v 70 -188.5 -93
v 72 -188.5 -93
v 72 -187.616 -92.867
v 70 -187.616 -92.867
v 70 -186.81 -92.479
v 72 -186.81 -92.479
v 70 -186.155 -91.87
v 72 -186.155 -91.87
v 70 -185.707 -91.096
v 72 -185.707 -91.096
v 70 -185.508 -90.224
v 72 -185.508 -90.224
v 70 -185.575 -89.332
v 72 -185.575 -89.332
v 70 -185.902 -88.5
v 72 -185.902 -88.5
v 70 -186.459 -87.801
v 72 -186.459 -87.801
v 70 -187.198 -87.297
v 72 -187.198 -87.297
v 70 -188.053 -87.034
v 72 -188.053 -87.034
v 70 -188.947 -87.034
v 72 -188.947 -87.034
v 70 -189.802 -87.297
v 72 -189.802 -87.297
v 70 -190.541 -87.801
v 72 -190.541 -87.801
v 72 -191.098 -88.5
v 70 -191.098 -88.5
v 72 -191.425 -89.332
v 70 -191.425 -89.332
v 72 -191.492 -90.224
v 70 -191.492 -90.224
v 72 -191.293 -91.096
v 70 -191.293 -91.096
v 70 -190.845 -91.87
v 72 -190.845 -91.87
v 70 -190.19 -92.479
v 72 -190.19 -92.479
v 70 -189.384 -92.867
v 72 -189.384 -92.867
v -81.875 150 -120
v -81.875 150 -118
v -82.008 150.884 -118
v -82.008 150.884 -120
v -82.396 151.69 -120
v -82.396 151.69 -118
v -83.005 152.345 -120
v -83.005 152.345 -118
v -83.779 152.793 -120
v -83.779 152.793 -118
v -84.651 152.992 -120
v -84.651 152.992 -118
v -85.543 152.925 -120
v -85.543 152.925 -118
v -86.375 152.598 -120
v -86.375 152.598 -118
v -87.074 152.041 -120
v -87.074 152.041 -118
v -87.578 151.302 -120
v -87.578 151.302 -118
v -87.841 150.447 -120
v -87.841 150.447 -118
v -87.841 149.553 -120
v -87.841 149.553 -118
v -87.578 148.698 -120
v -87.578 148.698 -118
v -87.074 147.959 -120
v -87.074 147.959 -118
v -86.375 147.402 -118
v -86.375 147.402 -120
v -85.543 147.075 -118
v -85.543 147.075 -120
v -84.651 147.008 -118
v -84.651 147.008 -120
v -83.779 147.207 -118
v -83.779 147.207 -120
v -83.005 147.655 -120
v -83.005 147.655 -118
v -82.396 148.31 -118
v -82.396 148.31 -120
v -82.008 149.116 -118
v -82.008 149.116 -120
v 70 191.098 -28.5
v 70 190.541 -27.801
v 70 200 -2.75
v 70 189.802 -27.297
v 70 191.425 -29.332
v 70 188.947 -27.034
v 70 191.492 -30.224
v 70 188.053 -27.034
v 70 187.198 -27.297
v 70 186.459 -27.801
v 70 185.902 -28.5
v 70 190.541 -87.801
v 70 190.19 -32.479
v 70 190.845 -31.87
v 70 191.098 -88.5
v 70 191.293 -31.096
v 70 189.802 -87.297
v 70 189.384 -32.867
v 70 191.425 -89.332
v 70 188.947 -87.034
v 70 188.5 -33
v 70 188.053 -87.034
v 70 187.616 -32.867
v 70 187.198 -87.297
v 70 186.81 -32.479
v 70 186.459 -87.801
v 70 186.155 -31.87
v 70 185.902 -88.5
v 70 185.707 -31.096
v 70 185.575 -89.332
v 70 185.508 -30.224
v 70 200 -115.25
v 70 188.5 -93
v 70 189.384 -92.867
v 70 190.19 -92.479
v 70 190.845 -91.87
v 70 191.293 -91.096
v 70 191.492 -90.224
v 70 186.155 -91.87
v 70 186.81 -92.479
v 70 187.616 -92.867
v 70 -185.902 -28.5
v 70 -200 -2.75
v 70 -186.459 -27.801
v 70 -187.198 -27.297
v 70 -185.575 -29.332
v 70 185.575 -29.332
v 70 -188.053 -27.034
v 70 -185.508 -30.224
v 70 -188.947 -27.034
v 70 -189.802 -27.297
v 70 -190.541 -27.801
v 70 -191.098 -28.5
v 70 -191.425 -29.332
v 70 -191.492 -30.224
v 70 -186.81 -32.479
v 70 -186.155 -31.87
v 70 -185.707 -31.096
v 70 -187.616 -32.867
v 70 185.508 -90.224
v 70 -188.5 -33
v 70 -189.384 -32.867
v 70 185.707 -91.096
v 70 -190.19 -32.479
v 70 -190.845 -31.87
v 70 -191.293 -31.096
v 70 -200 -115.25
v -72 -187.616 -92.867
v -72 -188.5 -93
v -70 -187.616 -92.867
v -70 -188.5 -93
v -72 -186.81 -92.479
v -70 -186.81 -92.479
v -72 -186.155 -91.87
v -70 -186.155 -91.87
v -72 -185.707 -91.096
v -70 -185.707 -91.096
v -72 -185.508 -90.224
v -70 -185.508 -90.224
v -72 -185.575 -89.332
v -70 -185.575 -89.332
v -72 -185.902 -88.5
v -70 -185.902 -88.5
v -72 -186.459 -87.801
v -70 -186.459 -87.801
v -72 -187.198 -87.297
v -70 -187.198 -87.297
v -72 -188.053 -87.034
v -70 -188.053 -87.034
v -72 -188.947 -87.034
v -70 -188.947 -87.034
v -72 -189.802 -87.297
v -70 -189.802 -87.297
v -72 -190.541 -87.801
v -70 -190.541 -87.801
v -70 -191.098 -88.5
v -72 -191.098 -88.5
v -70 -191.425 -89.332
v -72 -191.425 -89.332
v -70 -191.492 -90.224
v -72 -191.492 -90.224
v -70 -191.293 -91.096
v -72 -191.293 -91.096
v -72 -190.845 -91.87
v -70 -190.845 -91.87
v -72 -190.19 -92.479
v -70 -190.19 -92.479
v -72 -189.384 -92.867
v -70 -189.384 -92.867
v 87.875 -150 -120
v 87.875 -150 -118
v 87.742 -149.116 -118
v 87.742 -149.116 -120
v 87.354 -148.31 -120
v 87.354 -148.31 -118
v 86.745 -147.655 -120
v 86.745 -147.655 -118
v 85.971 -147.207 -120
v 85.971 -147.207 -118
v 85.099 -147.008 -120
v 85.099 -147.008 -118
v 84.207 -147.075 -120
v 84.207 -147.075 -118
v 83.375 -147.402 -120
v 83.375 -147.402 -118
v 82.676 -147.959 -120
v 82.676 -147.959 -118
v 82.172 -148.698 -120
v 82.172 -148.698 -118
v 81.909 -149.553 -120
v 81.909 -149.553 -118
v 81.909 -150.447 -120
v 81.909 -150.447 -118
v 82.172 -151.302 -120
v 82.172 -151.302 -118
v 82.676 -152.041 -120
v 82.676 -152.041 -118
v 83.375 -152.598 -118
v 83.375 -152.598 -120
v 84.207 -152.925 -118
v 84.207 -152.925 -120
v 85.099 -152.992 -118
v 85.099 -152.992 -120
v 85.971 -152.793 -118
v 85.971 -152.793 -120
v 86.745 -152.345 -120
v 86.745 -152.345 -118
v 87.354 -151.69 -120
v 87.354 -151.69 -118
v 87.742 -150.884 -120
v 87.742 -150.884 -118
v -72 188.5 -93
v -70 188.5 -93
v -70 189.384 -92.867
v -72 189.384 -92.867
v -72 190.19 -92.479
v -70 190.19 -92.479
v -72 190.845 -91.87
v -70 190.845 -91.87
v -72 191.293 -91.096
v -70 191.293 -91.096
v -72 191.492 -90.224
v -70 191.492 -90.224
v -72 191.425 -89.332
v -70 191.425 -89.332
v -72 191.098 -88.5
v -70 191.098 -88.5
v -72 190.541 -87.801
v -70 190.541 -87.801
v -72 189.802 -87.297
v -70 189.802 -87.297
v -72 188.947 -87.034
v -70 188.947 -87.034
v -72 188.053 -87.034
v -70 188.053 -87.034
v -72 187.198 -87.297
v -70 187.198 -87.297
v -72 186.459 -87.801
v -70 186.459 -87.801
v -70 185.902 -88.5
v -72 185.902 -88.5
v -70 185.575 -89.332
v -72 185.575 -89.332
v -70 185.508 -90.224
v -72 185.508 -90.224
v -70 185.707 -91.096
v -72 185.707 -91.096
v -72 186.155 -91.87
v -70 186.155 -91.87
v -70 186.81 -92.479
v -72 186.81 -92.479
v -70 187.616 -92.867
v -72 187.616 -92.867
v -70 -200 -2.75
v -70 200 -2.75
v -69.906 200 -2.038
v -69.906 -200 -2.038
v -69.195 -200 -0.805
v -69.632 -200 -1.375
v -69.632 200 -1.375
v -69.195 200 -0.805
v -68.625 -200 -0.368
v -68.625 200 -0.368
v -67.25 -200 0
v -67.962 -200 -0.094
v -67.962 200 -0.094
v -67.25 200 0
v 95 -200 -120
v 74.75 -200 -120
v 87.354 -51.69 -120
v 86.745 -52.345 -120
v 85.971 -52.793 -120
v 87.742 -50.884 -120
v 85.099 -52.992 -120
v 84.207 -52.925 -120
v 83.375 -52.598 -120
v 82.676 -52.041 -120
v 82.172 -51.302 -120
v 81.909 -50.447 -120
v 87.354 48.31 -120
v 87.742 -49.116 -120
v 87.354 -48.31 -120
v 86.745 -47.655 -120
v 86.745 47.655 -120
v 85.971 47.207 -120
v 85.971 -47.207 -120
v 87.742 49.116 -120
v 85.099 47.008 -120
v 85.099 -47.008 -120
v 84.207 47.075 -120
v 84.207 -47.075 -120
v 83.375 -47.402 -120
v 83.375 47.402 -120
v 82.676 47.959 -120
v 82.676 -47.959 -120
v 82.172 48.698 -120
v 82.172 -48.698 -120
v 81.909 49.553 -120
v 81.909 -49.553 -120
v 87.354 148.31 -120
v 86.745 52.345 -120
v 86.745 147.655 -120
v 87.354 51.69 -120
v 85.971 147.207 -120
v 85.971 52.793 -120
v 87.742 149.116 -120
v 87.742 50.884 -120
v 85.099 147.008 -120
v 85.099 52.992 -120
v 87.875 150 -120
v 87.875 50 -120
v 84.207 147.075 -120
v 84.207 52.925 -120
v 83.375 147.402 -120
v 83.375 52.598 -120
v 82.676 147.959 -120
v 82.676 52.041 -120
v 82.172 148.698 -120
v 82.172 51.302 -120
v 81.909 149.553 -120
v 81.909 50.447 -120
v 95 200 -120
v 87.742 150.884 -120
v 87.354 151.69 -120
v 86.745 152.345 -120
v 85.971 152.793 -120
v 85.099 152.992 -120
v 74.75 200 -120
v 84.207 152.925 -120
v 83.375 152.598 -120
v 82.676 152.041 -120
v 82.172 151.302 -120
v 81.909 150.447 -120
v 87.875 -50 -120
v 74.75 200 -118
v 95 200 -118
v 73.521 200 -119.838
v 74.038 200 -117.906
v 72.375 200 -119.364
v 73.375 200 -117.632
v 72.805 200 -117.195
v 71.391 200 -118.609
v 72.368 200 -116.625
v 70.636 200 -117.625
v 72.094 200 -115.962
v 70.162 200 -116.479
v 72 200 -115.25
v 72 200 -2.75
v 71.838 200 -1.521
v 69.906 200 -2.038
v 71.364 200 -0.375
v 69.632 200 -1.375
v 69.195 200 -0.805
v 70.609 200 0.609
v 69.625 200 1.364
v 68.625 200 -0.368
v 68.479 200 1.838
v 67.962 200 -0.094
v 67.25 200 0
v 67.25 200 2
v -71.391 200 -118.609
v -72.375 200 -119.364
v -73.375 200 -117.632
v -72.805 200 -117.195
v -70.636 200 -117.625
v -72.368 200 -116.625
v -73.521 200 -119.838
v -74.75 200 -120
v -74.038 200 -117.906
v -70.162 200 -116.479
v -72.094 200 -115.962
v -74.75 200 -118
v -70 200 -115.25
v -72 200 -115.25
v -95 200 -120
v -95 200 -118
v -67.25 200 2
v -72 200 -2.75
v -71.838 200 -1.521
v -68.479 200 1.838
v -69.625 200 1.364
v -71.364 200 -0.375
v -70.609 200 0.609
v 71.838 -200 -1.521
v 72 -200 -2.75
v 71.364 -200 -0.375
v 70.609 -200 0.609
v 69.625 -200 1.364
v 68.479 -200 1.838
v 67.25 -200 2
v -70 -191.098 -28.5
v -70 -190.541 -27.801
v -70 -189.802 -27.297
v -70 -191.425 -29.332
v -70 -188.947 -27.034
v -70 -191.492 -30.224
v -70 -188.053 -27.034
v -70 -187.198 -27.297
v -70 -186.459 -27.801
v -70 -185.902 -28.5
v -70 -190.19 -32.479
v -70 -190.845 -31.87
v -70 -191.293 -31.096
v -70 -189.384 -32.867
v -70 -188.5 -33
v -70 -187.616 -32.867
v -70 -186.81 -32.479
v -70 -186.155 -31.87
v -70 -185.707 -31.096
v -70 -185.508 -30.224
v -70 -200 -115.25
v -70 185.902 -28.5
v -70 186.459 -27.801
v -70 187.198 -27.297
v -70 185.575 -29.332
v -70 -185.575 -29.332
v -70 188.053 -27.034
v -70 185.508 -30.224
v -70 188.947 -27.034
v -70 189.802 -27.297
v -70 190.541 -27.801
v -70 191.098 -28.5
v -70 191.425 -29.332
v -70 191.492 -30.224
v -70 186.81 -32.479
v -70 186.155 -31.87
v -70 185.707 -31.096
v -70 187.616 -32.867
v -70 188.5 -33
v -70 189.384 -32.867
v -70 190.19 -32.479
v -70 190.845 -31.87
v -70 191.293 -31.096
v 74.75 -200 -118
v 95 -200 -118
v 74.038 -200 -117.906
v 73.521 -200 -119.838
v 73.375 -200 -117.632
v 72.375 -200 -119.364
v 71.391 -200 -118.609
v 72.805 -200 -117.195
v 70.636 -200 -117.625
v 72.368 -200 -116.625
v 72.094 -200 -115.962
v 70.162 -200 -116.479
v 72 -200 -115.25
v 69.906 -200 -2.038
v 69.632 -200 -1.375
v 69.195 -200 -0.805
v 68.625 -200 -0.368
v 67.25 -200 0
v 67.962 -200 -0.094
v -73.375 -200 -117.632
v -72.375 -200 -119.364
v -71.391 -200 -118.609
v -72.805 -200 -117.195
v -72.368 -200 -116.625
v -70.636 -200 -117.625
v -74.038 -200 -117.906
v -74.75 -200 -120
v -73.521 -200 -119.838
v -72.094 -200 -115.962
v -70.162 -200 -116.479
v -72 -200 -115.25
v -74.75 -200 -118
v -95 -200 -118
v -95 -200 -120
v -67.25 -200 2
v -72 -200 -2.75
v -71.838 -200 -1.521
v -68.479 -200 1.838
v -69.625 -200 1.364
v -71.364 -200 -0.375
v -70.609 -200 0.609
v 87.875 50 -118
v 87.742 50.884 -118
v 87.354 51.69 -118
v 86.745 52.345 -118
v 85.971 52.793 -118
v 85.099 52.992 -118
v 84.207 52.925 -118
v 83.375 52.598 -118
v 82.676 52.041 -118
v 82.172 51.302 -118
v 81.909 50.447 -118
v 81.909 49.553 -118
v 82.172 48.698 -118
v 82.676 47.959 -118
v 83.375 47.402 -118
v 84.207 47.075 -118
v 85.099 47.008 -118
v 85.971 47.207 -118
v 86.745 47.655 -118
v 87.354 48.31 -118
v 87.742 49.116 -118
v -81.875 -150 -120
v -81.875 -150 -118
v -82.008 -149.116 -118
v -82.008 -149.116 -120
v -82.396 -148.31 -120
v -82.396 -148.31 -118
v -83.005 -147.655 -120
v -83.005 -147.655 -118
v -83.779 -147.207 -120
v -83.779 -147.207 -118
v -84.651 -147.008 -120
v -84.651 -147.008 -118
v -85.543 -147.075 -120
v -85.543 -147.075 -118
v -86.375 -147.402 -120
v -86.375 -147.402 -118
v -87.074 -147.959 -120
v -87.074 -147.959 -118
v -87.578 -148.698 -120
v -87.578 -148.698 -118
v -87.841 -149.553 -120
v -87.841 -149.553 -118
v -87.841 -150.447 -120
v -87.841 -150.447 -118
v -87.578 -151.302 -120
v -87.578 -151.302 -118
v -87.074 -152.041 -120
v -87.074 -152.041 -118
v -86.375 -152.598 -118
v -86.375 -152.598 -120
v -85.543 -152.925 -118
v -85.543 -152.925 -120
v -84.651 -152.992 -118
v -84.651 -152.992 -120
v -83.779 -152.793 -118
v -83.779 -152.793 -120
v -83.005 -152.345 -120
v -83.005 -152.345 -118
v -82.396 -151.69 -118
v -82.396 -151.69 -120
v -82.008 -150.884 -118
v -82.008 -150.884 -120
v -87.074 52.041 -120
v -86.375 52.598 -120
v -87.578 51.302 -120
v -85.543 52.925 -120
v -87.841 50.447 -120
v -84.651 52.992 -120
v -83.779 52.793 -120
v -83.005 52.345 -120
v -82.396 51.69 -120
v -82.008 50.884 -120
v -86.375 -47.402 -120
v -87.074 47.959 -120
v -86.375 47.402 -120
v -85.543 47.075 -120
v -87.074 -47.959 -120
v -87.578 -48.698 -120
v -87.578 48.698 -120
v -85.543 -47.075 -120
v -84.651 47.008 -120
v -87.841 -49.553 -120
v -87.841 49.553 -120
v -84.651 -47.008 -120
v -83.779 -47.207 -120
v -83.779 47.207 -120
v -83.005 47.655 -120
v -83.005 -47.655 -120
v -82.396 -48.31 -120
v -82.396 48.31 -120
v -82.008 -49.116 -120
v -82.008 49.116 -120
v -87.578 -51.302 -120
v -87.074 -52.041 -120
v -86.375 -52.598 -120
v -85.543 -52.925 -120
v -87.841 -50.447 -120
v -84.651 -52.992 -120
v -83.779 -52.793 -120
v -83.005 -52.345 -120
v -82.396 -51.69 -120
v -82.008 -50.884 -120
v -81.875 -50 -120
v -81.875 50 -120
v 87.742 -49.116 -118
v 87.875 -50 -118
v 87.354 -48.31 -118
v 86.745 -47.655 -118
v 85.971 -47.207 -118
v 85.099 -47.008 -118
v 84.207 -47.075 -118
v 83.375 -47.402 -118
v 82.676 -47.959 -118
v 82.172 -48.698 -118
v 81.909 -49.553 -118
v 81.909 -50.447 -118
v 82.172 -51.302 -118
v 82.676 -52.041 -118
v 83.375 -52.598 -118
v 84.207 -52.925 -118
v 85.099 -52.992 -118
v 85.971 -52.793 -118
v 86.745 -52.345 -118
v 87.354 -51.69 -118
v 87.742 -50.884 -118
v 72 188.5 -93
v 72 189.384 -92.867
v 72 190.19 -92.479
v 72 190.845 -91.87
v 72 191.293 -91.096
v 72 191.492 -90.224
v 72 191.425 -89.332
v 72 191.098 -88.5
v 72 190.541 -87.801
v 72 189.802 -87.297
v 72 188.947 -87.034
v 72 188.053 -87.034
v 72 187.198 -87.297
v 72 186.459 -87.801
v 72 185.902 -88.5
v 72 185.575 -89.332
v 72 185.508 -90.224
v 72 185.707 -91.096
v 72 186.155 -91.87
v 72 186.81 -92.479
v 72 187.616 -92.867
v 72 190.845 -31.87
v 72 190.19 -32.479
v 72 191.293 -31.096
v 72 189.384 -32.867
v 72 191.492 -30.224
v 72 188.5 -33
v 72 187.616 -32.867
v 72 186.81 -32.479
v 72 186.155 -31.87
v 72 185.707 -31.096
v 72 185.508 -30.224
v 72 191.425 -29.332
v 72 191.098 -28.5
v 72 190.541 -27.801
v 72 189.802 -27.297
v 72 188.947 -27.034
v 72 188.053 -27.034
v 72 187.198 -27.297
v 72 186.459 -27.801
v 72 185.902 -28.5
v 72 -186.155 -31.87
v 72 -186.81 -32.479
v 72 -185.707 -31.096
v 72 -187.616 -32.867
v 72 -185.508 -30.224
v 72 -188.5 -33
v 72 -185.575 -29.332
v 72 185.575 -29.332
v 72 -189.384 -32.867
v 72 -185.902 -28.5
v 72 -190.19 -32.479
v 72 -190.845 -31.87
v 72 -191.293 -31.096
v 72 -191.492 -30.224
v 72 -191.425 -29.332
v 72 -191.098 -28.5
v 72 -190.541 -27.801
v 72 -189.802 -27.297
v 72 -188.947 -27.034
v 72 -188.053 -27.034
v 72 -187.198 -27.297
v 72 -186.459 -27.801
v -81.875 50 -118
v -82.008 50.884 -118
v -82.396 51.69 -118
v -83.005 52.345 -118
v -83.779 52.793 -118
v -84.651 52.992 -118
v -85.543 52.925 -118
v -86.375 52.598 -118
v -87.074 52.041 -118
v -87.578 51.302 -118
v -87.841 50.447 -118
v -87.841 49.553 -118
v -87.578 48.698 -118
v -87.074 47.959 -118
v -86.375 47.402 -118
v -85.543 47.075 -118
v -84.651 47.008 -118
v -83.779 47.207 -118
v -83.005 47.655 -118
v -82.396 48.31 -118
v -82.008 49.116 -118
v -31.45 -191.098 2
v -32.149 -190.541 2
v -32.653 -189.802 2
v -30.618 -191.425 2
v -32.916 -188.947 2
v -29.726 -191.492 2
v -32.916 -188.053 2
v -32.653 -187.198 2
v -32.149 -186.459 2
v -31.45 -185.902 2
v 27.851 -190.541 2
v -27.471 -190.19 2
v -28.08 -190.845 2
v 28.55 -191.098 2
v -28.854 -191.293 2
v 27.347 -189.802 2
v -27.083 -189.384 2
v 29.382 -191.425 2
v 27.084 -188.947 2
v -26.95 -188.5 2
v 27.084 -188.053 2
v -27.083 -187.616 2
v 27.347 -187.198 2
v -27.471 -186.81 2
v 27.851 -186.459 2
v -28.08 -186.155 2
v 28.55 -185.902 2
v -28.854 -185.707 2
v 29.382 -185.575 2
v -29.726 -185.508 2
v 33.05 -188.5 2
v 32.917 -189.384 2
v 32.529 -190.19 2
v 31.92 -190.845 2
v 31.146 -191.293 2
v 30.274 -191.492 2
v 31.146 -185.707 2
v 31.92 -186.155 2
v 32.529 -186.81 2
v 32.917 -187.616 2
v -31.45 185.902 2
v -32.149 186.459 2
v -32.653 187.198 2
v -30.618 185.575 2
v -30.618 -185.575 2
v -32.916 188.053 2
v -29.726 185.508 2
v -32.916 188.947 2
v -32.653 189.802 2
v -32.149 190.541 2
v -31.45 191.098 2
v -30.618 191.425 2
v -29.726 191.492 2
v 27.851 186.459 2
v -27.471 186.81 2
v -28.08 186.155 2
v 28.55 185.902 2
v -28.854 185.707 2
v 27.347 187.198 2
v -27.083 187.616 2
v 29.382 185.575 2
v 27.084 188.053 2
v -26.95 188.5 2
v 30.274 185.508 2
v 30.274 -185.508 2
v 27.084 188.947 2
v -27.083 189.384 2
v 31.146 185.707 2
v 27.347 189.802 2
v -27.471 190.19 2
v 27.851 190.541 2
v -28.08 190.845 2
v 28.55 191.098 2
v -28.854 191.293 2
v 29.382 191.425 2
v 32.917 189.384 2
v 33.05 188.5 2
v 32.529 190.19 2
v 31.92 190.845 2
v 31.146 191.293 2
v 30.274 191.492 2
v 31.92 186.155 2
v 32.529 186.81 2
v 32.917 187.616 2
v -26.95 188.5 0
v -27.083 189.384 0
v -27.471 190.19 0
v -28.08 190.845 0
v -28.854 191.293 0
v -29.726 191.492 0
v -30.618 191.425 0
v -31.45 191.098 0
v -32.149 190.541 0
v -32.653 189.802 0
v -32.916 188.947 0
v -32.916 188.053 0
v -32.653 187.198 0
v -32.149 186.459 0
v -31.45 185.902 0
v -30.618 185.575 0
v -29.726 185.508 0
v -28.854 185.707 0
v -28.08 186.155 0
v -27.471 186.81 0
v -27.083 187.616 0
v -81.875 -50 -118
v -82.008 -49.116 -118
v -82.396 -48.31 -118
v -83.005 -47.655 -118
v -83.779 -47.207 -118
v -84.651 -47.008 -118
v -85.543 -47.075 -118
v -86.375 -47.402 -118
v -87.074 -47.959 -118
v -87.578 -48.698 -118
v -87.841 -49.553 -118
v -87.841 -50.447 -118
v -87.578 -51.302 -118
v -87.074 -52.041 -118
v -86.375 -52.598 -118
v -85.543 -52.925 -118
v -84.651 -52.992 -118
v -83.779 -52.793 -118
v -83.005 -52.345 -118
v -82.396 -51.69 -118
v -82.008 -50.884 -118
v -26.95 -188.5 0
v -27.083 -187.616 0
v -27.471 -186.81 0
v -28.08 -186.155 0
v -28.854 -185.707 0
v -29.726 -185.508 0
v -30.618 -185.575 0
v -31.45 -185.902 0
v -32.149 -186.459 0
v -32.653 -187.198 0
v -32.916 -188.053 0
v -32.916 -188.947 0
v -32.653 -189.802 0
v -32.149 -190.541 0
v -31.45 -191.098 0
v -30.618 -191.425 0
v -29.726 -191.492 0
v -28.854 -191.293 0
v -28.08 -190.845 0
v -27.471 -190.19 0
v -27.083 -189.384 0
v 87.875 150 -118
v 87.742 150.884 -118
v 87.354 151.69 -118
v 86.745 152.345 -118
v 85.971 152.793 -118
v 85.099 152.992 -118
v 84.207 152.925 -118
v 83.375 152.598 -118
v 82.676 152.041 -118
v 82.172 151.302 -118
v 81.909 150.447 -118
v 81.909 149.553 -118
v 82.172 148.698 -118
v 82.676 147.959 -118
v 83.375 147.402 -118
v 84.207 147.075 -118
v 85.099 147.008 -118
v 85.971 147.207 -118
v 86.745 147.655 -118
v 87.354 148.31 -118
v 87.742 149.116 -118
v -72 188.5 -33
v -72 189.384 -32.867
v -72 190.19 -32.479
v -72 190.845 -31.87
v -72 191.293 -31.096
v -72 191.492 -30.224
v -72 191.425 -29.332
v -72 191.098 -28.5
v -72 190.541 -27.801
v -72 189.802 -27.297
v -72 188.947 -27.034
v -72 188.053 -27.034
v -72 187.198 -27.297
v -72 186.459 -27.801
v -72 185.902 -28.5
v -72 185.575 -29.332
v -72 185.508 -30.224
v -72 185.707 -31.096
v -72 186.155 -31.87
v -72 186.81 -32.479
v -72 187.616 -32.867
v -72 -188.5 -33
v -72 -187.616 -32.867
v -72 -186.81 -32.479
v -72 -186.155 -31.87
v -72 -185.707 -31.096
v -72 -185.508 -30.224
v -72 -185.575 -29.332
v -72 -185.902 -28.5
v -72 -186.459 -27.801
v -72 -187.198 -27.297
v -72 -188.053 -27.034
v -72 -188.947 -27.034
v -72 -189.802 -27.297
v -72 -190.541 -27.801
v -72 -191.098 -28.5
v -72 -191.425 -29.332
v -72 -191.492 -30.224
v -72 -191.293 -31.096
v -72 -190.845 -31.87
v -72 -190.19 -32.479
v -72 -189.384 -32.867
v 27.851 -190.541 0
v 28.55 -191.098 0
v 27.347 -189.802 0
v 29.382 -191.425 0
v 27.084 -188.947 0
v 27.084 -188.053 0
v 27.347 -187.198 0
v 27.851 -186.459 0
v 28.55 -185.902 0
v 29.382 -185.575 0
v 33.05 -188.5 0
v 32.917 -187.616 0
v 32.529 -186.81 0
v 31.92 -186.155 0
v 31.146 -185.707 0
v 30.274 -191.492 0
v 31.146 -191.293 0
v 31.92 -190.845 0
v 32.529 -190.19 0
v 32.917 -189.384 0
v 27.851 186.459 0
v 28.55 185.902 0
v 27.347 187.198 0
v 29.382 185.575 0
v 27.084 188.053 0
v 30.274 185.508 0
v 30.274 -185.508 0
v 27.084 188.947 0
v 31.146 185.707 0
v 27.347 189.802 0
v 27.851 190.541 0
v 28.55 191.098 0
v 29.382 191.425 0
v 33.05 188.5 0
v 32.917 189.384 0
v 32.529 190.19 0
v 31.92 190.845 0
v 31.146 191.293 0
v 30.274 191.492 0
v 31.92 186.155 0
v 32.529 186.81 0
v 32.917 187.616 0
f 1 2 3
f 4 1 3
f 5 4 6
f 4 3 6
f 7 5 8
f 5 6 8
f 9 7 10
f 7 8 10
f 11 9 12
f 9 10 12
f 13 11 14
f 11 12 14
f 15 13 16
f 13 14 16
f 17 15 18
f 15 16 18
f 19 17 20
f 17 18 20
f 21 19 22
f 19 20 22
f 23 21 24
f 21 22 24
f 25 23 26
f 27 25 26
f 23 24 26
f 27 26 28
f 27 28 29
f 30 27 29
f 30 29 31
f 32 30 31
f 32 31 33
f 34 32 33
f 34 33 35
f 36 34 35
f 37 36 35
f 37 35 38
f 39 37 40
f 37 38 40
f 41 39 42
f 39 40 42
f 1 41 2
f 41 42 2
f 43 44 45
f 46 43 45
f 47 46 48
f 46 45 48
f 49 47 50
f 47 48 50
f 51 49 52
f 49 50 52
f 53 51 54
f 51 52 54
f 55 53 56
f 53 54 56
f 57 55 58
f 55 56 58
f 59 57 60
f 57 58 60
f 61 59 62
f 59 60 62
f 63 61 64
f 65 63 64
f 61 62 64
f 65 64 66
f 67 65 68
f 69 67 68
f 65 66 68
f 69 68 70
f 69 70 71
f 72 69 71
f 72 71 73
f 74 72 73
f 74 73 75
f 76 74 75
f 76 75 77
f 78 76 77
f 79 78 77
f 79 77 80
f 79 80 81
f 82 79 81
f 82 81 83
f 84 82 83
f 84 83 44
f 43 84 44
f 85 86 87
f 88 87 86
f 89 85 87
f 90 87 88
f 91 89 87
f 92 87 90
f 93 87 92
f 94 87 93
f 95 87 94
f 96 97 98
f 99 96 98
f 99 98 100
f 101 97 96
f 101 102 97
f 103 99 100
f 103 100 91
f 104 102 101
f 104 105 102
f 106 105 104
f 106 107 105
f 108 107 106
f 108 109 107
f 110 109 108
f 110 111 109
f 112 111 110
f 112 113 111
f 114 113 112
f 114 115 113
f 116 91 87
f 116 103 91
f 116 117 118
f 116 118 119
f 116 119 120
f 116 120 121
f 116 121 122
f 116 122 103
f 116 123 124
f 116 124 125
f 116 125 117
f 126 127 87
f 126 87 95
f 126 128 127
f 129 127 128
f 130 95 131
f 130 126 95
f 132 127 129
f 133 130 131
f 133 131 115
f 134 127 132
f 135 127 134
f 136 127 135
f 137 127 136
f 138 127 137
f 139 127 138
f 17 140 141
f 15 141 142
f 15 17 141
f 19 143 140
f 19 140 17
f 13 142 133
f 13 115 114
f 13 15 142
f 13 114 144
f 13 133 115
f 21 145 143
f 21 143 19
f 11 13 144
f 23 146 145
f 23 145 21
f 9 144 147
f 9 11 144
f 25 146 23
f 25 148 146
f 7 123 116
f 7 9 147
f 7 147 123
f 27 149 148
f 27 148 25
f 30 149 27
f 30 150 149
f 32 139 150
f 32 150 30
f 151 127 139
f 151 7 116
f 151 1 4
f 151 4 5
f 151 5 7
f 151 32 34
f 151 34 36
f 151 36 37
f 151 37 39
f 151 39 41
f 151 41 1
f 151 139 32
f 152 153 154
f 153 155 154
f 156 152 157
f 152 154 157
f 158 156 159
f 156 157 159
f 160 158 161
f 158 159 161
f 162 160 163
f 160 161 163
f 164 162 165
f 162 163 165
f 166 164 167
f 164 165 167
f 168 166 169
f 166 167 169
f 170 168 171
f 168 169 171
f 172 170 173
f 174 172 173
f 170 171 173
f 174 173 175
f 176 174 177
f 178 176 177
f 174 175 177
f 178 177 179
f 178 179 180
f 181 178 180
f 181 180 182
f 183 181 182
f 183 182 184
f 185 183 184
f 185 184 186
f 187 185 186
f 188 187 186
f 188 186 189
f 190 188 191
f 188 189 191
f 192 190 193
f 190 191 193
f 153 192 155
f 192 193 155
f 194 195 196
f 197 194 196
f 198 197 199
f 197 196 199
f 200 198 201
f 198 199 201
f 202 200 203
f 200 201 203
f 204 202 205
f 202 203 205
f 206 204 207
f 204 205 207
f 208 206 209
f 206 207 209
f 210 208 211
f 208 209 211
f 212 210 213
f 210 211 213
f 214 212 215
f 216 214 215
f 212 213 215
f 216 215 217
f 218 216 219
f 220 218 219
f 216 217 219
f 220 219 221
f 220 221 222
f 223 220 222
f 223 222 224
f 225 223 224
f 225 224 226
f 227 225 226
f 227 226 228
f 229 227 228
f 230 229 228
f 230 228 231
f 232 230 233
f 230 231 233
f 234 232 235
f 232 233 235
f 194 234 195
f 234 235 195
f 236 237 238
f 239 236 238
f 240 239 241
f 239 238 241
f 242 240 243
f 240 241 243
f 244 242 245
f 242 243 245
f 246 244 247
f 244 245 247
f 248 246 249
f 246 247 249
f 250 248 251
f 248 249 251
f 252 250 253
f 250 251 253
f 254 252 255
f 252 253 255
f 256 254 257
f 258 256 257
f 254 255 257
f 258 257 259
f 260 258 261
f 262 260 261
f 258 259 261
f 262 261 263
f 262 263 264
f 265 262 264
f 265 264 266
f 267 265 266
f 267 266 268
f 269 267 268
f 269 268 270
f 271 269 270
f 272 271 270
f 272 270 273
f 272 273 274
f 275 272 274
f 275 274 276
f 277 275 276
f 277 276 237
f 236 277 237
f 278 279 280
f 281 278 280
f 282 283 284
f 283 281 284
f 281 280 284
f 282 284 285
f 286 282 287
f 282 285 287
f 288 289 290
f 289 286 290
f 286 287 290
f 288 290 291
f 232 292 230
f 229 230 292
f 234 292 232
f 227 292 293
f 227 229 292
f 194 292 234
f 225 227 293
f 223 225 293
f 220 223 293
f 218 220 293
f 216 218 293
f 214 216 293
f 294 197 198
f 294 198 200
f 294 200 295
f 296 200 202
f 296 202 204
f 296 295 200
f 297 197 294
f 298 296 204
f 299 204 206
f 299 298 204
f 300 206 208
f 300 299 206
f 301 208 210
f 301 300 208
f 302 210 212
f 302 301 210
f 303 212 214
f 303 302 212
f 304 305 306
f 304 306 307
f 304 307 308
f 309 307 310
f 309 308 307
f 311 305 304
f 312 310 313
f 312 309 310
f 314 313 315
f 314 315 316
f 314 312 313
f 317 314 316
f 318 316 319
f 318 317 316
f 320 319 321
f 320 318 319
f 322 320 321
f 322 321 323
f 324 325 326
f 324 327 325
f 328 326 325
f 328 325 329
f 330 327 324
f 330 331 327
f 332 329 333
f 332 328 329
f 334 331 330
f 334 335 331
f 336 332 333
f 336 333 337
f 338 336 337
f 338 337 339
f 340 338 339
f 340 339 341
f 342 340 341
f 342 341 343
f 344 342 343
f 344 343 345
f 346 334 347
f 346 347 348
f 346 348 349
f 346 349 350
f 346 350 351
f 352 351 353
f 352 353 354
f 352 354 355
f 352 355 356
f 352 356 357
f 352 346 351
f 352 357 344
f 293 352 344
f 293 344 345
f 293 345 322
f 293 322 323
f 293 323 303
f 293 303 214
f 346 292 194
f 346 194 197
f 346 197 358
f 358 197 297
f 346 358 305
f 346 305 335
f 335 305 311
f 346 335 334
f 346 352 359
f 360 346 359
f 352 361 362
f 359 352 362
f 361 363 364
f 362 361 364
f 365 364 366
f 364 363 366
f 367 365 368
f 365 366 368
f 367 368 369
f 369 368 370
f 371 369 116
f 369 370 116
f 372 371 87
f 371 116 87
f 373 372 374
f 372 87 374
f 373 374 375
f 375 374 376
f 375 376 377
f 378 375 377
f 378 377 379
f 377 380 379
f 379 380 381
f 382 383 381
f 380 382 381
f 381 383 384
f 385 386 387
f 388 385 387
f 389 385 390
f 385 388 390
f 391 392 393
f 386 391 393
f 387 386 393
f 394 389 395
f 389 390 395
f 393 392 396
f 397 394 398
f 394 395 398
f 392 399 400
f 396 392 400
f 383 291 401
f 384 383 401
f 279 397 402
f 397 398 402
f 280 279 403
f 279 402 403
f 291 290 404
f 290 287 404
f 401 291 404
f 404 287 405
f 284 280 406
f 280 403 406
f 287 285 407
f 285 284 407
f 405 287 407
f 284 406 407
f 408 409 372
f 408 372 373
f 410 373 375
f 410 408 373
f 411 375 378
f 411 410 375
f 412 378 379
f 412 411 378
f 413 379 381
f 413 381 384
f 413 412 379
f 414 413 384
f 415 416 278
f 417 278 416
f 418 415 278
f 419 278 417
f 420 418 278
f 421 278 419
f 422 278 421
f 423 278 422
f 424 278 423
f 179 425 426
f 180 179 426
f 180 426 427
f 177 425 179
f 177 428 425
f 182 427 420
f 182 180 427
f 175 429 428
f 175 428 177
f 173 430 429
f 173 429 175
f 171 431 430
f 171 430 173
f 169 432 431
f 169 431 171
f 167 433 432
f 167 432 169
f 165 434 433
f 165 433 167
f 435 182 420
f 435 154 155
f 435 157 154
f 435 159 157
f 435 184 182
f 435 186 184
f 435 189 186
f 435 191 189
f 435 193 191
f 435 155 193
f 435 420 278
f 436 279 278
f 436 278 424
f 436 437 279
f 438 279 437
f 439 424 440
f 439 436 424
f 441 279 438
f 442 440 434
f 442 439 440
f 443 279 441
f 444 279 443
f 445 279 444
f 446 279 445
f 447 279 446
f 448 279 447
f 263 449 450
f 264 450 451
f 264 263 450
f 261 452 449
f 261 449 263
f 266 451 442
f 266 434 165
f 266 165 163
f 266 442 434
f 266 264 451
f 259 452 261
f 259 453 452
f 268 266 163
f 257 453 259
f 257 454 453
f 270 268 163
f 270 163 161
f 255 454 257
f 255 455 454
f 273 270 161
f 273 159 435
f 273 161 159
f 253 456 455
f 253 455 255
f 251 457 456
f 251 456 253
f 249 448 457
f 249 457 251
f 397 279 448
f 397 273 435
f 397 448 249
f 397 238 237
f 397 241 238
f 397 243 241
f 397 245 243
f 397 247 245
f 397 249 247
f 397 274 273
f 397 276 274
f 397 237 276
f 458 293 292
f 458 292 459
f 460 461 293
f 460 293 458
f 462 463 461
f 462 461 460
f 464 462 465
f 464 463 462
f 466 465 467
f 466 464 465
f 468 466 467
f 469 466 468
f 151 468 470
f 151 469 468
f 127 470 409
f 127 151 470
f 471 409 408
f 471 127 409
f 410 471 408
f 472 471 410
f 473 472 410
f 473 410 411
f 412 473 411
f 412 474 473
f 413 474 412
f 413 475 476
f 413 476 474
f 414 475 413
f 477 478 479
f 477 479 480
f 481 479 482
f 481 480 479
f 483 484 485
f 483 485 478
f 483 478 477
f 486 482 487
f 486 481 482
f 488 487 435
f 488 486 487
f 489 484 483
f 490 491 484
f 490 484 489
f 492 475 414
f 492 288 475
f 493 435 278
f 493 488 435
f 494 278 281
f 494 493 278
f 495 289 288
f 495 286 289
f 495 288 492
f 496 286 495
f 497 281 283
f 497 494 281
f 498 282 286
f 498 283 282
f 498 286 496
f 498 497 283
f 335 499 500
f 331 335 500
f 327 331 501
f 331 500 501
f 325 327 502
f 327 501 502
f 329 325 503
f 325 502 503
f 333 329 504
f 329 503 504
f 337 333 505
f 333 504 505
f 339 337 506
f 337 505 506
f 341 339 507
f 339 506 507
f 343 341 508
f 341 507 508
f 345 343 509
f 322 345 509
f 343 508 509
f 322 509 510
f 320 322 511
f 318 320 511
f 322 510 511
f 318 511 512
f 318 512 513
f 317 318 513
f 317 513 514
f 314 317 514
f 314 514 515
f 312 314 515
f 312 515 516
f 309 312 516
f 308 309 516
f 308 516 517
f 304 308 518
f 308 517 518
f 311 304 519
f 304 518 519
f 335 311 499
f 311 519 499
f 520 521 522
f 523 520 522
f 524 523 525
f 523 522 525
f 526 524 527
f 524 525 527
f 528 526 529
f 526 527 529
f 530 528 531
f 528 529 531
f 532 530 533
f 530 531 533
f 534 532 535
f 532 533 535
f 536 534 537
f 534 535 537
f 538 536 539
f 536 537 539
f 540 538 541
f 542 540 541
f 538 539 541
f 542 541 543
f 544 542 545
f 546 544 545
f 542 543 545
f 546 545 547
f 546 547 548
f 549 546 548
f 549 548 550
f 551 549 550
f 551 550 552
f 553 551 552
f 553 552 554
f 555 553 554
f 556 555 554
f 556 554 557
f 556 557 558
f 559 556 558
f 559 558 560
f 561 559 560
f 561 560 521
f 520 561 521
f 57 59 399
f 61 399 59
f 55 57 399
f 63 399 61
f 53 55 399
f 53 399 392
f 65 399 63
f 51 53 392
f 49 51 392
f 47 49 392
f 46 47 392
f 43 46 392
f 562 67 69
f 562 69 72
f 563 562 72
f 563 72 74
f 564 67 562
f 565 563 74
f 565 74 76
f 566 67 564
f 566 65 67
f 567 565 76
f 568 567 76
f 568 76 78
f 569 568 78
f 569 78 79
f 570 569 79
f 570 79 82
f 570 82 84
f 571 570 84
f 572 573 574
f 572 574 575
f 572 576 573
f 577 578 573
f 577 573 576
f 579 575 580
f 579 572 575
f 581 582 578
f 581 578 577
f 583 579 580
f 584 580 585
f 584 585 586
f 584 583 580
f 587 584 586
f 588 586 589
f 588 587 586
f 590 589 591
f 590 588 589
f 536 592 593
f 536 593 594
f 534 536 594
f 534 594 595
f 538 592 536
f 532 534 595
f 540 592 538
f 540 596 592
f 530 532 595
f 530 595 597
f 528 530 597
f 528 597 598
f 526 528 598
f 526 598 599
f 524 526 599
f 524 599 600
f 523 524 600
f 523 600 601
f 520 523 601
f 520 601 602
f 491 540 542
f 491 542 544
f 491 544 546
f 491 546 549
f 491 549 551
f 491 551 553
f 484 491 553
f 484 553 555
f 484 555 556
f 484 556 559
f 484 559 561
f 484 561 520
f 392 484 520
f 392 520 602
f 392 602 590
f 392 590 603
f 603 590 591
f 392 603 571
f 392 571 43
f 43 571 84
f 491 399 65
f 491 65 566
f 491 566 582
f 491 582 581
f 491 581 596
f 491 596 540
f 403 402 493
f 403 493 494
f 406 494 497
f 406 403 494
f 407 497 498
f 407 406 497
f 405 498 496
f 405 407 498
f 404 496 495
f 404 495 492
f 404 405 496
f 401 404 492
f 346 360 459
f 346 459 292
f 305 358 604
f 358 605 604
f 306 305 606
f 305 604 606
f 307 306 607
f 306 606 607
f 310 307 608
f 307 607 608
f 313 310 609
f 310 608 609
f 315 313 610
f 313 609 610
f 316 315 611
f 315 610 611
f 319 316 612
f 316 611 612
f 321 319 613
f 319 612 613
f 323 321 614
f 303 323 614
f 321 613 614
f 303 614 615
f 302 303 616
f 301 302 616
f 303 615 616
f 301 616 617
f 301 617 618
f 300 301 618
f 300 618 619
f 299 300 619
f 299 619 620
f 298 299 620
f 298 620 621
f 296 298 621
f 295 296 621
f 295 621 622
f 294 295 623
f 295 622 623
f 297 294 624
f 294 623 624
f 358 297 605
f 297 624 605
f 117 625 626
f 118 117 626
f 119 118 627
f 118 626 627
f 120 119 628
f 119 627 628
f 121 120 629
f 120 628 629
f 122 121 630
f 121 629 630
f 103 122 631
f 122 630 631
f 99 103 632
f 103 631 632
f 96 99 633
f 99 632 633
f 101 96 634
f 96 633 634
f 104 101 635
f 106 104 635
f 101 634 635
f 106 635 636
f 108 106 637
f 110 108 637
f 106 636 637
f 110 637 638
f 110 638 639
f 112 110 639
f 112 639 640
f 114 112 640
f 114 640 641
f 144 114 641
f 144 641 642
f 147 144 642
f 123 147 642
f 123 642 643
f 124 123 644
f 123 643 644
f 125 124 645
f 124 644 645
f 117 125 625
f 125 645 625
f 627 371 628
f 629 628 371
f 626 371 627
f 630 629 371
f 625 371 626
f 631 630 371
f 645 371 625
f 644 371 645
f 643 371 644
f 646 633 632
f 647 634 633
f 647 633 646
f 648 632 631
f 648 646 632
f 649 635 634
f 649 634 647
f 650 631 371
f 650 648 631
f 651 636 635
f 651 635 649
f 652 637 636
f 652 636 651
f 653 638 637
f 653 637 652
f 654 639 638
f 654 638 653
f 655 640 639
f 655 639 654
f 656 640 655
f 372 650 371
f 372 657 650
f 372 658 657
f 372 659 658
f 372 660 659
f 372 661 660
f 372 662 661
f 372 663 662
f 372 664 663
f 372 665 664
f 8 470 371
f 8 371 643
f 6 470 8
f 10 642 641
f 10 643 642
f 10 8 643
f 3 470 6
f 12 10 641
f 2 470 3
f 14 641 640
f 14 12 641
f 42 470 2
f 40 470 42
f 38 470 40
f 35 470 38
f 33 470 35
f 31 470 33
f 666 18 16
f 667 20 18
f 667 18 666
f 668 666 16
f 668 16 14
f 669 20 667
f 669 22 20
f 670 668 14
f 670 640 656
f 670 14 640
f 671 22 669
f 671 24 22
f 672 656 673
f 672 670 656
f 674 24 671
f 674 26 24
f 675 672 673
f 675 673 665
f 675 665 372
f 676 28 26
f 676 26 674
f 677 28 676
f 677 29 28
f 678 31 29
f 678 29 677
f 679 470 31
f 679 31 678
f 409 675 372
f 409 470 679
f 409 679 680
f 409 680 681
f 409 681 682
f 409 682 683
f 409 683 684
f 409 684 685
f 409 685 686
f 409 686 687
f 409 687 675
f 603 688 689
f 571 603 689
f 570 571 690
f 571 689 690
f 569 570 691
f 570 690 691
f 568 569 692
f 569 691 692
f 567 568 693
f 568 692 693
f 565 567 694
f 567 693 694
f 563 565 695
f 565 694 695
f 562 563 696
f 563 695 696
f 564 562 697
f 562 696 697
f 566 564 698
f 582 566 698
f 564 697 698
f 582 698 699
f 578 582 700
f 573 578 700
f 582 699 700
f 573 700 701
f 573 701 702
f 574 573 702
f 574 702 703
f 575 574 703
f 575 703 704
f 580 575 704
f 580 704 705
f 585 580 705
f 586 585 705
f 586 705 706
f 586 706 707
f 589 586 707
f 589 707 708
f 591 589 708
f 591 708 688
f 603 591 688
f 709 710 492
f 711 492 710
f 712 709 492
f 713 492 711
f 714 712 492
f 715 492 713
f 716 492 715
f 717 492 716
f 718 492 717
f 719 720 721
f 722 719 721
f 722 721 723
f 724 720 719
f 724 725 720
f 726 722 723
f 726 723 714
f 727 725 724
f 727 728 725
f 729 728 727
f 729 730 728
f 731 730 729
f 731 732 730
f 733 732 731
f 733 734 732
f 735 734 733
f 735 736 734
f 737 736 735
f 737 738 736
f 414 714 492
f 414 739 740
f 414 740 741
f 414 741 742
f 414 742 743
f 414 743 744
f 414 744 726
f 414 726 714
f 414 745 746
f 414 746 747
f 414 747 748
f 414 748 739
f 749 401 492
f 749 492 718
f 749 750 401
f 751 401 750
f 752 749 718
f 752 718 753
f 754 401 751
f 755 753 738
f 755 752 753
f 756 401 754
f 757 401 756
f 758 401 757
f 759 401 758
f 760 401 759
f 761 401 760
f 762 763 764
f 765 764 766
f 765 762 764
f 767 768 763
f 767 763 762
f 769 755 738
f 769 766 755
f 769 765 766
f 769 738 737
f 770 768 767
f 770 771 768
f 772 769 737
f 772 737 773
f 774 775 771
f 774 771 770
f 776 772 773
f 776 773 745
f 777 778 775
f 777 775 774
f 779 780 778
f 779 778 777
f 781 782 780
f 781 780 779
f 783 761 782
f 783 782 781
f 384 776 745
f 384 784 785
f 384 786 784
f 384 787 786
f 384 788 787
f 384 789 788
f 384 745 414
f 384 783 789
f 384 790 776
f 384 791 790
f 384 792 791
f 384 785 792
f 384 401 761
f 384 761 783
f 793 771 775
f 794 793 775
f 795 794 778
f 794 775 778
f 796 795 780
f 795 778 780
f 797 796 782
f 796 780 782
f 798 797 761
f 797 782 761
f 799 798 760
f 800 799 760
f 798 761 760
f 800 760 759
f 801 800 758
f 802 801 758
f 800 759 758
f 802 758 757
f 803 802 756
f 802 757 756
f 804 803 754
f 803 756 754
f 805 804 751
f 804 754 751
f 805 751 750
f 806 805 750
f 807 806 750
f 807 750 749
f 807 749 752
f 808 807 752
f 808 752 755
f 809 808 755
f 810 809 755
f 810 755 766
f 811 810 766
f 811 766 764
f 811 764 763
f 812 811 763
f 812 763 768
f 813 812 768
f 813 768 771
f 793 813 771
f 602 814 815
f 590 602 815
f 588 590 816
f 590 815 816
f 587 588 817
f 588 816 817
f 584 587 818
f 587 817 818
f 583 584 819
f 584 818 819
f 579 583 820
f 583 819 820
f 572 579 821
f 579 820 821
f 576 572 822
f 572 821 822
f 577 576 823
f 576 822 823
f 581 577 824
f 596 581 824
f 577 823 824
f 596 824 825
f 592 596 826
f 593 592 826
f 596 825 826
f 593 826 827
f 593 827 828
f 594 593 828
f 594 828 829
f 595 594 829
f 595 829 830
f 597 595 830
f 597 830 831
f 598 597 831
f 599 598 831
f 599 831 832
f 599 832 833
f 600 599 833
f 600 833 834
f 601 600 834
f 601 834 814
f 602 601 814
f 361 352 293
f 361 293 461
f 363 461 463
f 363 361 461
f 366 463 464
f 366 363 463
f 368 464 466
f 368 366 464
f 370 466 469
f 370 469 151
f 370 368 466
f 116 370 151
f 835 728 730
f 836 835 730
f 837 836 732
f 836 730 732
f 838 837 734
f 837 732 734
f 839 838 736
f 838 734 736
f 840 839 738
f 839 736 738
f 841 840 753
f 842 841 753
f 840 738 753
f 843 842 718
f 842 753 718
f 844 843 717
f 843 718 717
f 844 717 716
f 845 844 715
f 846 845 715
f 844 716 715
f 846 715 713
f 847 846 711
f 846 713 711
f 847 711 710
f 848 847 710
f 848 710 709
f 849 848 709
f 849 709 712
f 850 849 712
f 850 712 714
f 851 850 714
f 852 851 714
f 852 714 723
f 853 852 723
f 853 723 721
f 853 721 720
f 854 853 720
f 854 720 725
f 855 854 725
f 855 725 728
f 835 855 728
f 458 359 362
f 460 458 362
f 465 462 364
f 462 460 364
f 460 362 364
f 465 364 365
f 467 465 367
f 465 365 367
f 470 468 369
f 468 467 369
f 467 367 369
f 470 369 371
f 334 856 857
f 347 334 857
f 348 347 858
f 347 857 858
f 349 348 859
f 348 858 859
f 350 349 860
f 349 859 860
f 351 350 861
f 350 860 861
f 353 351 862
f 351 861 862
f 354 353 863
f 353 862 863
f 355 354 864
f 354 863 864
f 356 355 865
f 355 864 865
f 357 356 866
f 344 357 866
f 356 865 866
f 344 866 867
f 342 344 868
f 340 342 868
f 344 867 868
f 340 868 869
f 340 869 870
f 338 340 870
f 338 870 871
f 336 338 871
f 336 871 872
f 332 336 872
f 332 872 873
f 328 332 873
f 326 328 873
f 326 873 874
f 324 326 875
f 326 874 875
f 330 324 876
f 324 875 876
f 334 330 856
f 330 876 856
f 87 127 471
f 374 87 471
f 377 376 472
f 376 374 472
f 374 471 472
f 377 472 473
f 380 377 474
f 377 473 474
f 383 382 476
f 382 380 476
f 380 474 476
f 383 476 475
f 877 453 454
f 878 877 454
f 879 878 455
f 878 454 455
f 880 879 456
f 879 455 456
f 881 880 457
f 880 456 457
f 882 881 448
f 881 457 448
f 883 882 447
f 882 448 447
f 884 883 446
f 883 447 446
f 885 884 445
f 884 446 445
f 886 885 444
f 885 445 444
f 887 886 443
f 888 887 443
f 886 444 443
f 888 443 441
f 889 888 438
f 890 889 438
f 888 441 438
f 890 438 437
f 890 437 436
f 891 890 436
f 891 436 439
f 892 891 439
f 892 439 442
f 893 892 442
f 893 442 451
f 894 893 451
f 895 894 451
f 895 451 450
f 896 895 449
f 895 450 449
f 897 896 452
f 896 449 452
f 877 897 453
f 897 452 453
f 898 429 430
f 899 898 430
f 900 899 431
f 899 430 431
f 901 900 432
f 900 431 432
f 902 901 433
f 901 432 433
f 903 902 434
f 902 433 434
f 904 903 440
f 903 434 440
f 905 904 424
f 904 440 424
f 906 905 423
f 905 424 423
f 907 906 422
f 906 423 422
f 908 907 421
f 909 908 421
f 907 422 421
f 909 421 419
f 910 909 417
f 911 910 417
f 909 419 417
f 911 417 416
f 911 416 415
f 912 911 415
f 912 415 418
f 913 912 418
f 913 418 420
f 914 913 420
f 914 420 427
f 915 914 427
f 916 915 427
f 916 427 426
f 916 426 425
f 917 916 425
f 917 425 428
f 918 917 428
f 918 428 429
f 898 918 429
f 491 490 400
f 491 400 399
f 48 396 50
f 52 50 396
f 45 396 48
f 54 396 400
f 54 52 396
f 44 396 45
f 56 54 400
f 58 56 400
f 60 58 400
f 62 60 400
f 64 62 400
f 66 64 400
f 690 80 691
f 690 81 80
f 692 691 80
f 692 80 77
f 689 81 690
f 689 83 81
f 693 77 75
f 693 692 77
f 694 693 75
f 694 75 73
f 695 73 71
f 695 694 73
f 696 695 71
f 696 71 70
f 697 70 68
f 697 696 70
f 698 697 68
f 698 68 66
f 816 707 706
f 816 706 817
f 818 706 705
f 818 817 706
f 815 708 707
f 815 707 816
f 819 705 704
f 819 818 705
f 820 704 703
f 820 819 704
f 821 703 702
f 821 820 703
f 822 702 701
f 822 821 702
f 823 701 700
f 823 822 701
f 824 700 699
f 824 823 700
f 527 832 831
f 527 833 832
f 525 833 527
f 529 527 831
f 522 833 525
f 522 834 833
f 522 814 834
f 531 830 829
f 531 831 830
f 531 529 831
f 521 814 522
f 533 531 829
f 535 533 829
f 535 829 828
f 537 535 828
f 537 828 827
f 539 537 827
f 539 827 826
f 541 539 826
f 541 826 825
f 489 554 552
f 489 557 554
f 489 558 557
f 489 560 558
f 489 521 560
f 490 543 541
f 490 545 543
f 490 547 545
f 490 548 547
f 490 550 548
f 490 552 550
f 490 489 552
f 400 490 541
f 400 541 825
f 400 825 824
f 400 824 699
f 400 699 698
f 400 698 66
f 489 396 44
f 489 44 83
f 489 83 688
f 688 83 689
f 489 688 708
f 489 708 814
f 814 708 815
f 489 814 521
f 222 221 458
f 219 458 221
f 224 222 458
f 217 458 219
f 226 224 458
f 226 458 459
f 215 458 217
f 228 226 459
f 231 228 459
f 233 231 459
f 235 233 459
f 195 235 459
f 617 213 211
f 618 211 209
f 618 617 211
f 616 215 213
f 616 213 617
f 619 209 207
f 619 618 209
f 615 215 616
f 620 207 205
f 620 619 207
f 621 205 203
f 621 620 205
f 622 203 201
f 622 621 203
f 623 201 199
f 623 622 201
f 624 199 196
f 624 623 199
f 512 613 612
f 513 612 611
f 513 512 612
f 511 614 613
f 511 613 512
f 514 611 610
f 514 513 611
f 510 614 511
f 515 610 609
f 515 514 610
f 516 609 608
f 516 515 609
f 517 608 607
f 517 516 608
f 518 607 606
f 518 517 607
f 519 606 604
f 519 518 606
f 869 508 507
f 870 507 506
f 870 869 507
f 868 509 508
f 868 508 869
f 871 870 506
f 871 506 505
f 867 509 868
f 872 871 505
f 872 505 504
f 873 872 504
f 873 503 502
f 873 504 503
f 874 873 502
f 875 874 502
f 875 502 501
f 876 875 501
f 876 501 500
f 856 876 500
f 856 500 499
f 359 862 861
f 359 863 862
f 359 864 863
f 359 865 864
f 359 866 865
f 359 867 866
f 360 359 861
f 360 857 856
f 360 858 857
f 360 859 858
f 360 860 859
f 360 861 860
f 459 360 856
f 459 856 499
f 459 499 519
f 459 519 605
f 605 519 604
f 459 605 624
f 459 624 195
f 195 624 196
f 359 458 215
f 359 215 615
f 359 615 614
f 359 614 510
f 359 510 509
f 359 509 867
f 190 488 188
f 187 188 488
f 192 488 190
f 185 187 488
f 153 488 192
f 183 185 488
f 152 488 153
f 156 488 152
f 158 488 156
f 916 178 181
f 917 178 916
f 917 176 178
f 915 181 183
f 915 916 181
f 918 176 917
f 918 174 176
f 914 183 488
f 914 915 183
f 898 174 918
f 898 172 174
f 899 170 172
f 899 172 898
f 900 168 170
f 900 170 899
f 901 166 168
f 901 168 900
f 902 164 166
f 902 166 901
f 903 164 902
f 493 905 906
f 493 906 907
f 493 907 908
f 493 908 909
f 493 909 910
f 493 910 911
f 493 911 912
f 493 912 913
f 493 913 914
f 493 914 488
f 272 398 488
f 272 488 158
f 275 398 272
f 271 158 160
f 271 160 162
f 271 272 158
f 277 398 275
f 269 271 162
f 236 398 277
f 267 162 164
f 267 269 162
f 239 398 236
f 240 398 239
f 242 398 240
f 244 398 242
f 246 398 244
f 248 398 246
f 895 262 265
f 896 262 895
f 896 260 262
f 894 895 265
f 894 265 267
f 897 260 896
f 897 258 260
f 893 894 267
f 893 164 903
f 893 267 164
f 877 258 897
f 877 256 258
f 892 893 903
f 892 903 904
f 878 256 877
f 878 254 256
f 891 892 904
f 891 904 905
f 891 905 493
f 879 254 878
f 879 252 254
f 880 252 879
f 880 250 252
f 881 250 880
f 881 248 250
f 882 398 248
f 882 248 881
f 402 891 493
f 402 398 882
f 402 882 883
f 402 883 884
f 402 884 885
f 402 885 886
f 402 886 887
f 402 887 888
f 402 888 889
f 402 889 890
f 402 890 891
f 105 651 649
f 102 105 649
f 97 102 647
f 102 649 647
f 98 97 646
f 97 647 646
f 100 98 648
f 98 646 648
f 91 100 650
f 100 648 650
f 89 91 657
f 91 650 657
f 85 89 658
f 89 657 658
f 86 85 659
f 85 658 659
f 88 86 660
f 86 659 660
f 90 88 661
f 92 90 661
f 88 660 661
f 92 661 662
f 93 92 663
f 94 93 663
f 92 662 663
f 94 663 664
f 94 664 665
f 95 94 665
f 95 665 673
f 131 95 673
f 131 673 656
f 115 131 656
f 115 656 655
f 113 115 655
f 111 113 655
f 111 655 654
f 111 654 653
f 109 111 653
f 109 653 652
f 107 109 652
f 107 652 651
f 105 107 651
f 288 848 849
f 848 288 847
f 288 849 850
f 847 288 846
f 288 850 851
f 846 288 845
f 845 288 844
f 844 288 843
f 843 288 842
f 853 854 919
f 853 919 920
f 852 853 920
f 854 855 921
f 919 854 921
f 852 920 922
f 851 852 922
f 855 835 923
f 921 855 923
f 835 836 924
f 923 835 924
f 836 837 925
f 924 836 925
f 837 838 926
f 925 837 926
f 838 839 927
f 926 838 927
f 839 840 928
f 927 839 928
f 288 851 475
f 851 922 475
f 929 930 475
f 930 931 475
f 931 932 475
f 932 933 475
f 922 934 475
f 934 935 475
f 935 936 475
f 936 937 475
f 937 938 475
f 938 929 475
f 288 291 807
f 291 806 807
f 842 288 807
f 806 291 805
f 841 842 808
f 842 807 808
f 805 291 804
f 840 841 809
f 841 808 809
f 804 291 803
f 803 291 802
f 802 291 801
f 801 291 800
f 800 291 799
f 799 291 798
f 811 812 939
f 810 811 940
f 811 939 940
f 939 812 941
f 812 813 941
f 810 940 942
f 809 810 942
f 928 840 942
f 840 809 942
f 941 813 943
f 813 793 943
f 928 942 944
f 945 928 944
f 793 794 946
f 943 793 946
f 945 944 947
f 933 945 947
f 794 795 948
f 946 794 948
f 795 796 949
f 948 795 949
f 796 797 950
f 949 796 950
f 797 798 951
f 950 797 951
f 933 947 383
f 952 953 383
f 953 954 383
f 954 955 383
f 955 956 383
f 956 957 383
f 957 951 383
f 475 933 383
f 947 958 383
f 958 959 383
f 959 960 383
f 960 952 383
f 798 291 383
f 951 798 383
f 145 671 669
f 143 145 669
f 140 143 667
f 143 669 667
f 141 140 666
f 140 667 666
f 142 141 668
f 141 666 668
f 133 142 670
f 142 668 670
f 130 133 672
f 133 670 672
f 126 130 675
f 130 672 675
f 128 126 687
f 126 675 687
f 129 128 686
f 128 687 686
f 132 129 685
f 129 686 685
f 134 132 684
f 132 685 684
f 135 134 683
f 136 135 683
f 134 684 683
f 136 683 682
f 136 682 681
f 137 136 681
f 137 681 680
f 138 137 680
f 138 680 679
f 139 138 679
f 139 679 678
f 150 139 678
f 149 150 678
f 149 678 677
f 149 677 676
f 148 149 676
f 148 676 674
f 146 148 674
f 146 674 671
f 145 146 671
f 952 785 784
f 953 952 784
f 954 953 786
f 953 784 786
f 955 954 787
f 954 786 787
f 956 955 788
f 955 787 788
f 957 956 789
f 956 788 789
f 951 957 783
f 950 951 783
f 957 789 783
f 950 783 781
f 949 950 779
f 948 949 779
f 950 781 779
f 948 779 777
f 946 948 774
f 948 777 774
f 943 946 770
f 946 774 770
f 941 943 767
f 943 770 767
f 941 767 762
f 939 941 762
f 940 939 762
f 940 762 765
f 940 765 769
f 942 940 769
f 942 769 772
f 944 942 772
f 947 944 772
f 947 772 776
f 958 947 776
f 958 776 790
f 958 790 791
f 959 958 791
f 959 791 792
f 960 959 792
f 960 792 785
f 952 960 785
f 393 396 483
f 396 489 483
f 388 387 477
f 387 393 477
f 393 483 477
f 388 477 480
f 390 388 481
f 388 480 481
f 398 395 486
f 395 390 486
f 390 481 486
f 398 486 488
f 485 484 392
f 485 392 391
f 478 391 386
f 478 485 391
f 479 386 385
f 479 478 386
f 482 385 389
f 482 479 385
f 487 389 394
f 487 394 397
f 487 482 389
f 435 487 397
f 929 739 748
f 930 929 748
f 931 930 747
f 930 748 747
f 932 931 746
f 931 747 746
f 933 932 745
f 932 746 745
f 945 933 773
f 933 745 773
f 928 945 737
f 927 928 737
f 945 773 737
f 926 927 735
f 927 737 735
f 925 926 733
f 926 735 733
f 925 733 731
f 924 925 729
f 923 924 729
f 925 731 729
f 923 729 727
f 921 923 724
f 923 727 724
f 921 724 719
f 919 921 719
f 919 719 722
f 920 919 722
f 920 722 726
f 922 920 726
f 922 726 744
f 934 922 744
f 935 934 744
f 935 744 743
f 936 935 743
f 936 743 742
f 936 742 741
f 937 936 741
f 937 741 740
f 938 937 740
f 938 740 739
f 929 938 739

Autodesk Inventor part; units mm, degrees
ref_plane "YZ Plane" through (0, 0, 0) normal (1, 0, 0) x (0, 1, 0)
ref_plane "XZ Plane" through (0, 0, 0) normal (0, 1, 0) x (-1, 0, 0)
ref_plane "XY Plane" through (0, 0, 0) normal (0, 0, 1) x (1, 0, 0)
sketch "Sketch1" plane through (0, 0, 0) normal (0, 0, 1) x (1, 0, 0)
  line L0 (-70, 200) -> (70, 200)
  line L1 (70, 200) -> (70, -200)
  line L2 (70, -200) -> (-70, -200)
  line L3 (-70, -200) -> (-70, 200)
  line L4 (-70, 200) -> (70, -200) construction
  point P0 (0, 0)
  point P1 (0, 0)
  dimension "d0" = 140
  dimension "d1" = 400
extrude "Plate1" add sketch "Sketch1" along normal blind 2
sketch "Sketch2" plane through (72, -200, 2) normal (-1, 0, 0) x (0, -1, 0)
  line L0 (-400, 0) -> (0, 0)
  line L1 (0, 0) -> (0, -120)
  line L2 (0, -120) -> (-400, -120)
  line L3 (-400, -120) -> (-400, 0)
edge flange "Flange1" height 120 angle 90 thickness 2 bend radius 2.75 thickness toward (-1, 0, 0) relief round relief width 2 relief depth 1 edges at (70, 0, 0) wall of the first edge with corners at (72, 200, 2) (72, -200, 2) (72, -200, -118) (72, 200, -118)
bend "Bend1"
corner "Corner1"
sketch "Sketch3" plane through (-72, 200, 2) normal (1, 0, 0) x (0, 1, 0)
  line L0 (-400, 0) -> (0, 0)
  line L1 (0, 0) -> (0, -120)
  line L2 (0, -120) -> (-400, -120)
  line L3 (-400, -120) -> (-400, 0)
edge flange "Flange2" height 120 angle 90 thickness 2 bend radius 2.75 thickness toward (1, 0, 0) relief round relief width 2 relief depth 1 edges at (-70, 0, 0) wall of the first edge with corners at (-72, -200, 2) (-72, 200, 2) (-72, 200, -118) (-72, -200, -118)
bend "Bend2"
corner "Corner2"
sketch "Sketch4" plane through (70, 200, -120) normal (0, 0, 1) x (1, 0, 0)
  line L0 (0, -400) -> (0, 0)
  line L1 (0, 0) -> (25, 0)
  line L2 (25, 0) -> (25, -400)
  line L3 (25, -400) -> (0, -400)
edge flange "Flange3" height 25 angle 90 thickness 2 bend radius 2.75 thickness toward (0, 0, 1) relief round relief width 2 relief depth 1 edges at (72, 0, -118) wall of the first edge with corners at (70, -200, -120) (70, 200, -120) (95, 200, -120) (95, -200, -120)
bend "Bend3"
corner "Corner3"
sketch "Sketch5" plane through (-70, -200, -120) normal (0, 0, 1) x (1, 0, 0)
  line L0 (0, 400) -> (0, 0)
  line L1 (0, 0) -> (-25, 0)
  line L2 (-25, 0) -> (-25, 400)
  line L3 (-25, 400) -> (0, 400)
edge flange "Flange4" height 25 angle 90 thickness 2 bend radius 2.75 thickness toward (0, 0, 1) relief round relief width 2 relief depth 1 edges at (-72, 0, -118) wall of the first edge with corners at (-70, 200, -120) (-70, -200, -120) (-95, -200, -120) (-95, 200, -120)
bend "Bend4"
corner "Corner4"
sketch "Sketch6" plane through (95, -200, -118) normal (0, 0, 1) x (1, 0, 0)
  circle A0 centre (-10.125, 350) radius 3
  line L0 (-20.25, 400) -> (0, 400) projected
  point P0 (-95, 200)
  point P1 (-10.125, 400)
  dimension "d43" = 6
  dimension "d44" = 50
extrude "Extrusion1" cut sketch "Sketch6" against normal through all
pattern_linear "Rectangular Pattern2" count 4 spacing 100 along (0, -1, 0) count 2 spacing 169.75 along (-1, 0, 0) of "Extrusion1"
sketch "Sketch8" plane through (72, -200, -2.75) normal (1, 0, 0) x (0, 0, -1)
  line L0 (0, 400) -> (112.5, 400) projected
  line L1 (117.25, 0) -> (117.25, 400) projected
  circle A0 centre (87.25, 388.5) radius 3
  circle A1 centre (27.25, 388.5) radius 3
  point P0 (-2.75, 200)
  dimension "d68" = 6
  dimension "d69" = 60
  dimension "d78" = 30
  dimension "d79" = 11.5
extrude "Extrusion3" cut sketch "Sketch8" against normal through all
sketch "Sketch9" plane through (0, 0, 2) normal (0, 0, 1) x (1, 0, 0)
  circle A0 centre (-29.95, 188.5) radius 3
  line L0 (-67.25, 200) -> (67.25, 200) projected
  line L1 (-67.25, 200) -> (-67.25, -200) projected
  circle A1 centre (30.05, 188.5) radius 3
  point P0 (0, 0)
  point P1 (67.25, 200)
  dimension "d72" = 6
  dimension "d73" = 11.5
  dimension "d74" = 37.3
  dimension "d80" = 60
extrude "Extrusion4" cut sketch "Sketch9" against normal through all
mirror "Mirror2" about plane through (0, 0, 0) normal (0, 1, 0) of "Extrusion3", "Extrusion4"
equation "\"d0\" = Ширина_крепления_корпуса"
equation "\"d1\" = Длина_базовой_пластины"
equation "\"d69\" = 0.5 * Длина_крепления_корпуса"
equation "\"d2\" = Thickness"
equation "\"d3\" = BendReliefWidth"
equation "\"d4\" = BendReliefDepth"
equation "\"d5\" = MinimumRemnant"
equation "\"d6\" = TransitionRadius"
equation "\"d7\" = Длина_крепления_корпуса"
equation "\"d9\" = BendRadius"
equation "\"d10\" = CornerReliefSize"
equation "\"d11\" = GapSize"
equation "\"d12\" = JacobiRadiusSize"
equation "\"d13\" = BendReliefWidth"
equation "\"d14\" = BendReliefDepth"
equation "\"d15\" = MinimumRemnant"
equation "\"d16\" = TransitionRadius"
equation "\"d17\" = Длина_крепления_корпуса"
equation "\"d19\" = BendRadius"
equation "\"d20\" = CornerReliefSize"
equation "\"d21\" = GapSize"
equation "\"d22\" = JacobiRadiusSize"
equation "\"d23\" = BendReliefWidth"
equation "\"d24\" = BendReliefDepth"
equation "\"d25\" = MinimumRemnant"
equation "\"d26\" = TransitionRadius"
equation "\"d29\" = BendRadius"
equation "\"d30\" = CornerReliefSize"
equation "\"d31\" = GapSize"
equation "\"d32\" = JacobiRadiusSize"
equation "\"d33\" = BendReliefWidth"
equation "\"d34\" = BendReliefDepth"
equation "\"d35\" = MinimumRemnant"
equation "\"d36\" = TransitionRadius"
equation "\"d39\" = BendRadius"
equation "\"d40\" = CornerReliefSize"
equation "\"d41\" = GapSize"
equation "\"d42\" = JacobiRadiusSize"
equation "\"BendReliefWidth\" = Thickness"
equation "\"BendReliefDepth\" = 0.5 * Thickness"
equation "\"CornerReliefSize\" = 4 * Thickness"
equation "\"MinimumRemnant\" = 2 * Thickness"
equation "\"TransitionRadius\" = BendRadius"
equation "\"JacobiRadiusSize\" = BendRadius"
equation "\"GapSize\" = Thickness"
equation "\"Ширина_крепления_корпуса\" = 140"
equation "\"Длина_базовой_пластины\" = 400"
equation "\"Длина_крепления_корпуса\" = 120"
equation "\"Thickness\" = 2"
equation "\"BendRadius\" = 2.75"
properties part number "Кожух" material "Stainless Steel"
